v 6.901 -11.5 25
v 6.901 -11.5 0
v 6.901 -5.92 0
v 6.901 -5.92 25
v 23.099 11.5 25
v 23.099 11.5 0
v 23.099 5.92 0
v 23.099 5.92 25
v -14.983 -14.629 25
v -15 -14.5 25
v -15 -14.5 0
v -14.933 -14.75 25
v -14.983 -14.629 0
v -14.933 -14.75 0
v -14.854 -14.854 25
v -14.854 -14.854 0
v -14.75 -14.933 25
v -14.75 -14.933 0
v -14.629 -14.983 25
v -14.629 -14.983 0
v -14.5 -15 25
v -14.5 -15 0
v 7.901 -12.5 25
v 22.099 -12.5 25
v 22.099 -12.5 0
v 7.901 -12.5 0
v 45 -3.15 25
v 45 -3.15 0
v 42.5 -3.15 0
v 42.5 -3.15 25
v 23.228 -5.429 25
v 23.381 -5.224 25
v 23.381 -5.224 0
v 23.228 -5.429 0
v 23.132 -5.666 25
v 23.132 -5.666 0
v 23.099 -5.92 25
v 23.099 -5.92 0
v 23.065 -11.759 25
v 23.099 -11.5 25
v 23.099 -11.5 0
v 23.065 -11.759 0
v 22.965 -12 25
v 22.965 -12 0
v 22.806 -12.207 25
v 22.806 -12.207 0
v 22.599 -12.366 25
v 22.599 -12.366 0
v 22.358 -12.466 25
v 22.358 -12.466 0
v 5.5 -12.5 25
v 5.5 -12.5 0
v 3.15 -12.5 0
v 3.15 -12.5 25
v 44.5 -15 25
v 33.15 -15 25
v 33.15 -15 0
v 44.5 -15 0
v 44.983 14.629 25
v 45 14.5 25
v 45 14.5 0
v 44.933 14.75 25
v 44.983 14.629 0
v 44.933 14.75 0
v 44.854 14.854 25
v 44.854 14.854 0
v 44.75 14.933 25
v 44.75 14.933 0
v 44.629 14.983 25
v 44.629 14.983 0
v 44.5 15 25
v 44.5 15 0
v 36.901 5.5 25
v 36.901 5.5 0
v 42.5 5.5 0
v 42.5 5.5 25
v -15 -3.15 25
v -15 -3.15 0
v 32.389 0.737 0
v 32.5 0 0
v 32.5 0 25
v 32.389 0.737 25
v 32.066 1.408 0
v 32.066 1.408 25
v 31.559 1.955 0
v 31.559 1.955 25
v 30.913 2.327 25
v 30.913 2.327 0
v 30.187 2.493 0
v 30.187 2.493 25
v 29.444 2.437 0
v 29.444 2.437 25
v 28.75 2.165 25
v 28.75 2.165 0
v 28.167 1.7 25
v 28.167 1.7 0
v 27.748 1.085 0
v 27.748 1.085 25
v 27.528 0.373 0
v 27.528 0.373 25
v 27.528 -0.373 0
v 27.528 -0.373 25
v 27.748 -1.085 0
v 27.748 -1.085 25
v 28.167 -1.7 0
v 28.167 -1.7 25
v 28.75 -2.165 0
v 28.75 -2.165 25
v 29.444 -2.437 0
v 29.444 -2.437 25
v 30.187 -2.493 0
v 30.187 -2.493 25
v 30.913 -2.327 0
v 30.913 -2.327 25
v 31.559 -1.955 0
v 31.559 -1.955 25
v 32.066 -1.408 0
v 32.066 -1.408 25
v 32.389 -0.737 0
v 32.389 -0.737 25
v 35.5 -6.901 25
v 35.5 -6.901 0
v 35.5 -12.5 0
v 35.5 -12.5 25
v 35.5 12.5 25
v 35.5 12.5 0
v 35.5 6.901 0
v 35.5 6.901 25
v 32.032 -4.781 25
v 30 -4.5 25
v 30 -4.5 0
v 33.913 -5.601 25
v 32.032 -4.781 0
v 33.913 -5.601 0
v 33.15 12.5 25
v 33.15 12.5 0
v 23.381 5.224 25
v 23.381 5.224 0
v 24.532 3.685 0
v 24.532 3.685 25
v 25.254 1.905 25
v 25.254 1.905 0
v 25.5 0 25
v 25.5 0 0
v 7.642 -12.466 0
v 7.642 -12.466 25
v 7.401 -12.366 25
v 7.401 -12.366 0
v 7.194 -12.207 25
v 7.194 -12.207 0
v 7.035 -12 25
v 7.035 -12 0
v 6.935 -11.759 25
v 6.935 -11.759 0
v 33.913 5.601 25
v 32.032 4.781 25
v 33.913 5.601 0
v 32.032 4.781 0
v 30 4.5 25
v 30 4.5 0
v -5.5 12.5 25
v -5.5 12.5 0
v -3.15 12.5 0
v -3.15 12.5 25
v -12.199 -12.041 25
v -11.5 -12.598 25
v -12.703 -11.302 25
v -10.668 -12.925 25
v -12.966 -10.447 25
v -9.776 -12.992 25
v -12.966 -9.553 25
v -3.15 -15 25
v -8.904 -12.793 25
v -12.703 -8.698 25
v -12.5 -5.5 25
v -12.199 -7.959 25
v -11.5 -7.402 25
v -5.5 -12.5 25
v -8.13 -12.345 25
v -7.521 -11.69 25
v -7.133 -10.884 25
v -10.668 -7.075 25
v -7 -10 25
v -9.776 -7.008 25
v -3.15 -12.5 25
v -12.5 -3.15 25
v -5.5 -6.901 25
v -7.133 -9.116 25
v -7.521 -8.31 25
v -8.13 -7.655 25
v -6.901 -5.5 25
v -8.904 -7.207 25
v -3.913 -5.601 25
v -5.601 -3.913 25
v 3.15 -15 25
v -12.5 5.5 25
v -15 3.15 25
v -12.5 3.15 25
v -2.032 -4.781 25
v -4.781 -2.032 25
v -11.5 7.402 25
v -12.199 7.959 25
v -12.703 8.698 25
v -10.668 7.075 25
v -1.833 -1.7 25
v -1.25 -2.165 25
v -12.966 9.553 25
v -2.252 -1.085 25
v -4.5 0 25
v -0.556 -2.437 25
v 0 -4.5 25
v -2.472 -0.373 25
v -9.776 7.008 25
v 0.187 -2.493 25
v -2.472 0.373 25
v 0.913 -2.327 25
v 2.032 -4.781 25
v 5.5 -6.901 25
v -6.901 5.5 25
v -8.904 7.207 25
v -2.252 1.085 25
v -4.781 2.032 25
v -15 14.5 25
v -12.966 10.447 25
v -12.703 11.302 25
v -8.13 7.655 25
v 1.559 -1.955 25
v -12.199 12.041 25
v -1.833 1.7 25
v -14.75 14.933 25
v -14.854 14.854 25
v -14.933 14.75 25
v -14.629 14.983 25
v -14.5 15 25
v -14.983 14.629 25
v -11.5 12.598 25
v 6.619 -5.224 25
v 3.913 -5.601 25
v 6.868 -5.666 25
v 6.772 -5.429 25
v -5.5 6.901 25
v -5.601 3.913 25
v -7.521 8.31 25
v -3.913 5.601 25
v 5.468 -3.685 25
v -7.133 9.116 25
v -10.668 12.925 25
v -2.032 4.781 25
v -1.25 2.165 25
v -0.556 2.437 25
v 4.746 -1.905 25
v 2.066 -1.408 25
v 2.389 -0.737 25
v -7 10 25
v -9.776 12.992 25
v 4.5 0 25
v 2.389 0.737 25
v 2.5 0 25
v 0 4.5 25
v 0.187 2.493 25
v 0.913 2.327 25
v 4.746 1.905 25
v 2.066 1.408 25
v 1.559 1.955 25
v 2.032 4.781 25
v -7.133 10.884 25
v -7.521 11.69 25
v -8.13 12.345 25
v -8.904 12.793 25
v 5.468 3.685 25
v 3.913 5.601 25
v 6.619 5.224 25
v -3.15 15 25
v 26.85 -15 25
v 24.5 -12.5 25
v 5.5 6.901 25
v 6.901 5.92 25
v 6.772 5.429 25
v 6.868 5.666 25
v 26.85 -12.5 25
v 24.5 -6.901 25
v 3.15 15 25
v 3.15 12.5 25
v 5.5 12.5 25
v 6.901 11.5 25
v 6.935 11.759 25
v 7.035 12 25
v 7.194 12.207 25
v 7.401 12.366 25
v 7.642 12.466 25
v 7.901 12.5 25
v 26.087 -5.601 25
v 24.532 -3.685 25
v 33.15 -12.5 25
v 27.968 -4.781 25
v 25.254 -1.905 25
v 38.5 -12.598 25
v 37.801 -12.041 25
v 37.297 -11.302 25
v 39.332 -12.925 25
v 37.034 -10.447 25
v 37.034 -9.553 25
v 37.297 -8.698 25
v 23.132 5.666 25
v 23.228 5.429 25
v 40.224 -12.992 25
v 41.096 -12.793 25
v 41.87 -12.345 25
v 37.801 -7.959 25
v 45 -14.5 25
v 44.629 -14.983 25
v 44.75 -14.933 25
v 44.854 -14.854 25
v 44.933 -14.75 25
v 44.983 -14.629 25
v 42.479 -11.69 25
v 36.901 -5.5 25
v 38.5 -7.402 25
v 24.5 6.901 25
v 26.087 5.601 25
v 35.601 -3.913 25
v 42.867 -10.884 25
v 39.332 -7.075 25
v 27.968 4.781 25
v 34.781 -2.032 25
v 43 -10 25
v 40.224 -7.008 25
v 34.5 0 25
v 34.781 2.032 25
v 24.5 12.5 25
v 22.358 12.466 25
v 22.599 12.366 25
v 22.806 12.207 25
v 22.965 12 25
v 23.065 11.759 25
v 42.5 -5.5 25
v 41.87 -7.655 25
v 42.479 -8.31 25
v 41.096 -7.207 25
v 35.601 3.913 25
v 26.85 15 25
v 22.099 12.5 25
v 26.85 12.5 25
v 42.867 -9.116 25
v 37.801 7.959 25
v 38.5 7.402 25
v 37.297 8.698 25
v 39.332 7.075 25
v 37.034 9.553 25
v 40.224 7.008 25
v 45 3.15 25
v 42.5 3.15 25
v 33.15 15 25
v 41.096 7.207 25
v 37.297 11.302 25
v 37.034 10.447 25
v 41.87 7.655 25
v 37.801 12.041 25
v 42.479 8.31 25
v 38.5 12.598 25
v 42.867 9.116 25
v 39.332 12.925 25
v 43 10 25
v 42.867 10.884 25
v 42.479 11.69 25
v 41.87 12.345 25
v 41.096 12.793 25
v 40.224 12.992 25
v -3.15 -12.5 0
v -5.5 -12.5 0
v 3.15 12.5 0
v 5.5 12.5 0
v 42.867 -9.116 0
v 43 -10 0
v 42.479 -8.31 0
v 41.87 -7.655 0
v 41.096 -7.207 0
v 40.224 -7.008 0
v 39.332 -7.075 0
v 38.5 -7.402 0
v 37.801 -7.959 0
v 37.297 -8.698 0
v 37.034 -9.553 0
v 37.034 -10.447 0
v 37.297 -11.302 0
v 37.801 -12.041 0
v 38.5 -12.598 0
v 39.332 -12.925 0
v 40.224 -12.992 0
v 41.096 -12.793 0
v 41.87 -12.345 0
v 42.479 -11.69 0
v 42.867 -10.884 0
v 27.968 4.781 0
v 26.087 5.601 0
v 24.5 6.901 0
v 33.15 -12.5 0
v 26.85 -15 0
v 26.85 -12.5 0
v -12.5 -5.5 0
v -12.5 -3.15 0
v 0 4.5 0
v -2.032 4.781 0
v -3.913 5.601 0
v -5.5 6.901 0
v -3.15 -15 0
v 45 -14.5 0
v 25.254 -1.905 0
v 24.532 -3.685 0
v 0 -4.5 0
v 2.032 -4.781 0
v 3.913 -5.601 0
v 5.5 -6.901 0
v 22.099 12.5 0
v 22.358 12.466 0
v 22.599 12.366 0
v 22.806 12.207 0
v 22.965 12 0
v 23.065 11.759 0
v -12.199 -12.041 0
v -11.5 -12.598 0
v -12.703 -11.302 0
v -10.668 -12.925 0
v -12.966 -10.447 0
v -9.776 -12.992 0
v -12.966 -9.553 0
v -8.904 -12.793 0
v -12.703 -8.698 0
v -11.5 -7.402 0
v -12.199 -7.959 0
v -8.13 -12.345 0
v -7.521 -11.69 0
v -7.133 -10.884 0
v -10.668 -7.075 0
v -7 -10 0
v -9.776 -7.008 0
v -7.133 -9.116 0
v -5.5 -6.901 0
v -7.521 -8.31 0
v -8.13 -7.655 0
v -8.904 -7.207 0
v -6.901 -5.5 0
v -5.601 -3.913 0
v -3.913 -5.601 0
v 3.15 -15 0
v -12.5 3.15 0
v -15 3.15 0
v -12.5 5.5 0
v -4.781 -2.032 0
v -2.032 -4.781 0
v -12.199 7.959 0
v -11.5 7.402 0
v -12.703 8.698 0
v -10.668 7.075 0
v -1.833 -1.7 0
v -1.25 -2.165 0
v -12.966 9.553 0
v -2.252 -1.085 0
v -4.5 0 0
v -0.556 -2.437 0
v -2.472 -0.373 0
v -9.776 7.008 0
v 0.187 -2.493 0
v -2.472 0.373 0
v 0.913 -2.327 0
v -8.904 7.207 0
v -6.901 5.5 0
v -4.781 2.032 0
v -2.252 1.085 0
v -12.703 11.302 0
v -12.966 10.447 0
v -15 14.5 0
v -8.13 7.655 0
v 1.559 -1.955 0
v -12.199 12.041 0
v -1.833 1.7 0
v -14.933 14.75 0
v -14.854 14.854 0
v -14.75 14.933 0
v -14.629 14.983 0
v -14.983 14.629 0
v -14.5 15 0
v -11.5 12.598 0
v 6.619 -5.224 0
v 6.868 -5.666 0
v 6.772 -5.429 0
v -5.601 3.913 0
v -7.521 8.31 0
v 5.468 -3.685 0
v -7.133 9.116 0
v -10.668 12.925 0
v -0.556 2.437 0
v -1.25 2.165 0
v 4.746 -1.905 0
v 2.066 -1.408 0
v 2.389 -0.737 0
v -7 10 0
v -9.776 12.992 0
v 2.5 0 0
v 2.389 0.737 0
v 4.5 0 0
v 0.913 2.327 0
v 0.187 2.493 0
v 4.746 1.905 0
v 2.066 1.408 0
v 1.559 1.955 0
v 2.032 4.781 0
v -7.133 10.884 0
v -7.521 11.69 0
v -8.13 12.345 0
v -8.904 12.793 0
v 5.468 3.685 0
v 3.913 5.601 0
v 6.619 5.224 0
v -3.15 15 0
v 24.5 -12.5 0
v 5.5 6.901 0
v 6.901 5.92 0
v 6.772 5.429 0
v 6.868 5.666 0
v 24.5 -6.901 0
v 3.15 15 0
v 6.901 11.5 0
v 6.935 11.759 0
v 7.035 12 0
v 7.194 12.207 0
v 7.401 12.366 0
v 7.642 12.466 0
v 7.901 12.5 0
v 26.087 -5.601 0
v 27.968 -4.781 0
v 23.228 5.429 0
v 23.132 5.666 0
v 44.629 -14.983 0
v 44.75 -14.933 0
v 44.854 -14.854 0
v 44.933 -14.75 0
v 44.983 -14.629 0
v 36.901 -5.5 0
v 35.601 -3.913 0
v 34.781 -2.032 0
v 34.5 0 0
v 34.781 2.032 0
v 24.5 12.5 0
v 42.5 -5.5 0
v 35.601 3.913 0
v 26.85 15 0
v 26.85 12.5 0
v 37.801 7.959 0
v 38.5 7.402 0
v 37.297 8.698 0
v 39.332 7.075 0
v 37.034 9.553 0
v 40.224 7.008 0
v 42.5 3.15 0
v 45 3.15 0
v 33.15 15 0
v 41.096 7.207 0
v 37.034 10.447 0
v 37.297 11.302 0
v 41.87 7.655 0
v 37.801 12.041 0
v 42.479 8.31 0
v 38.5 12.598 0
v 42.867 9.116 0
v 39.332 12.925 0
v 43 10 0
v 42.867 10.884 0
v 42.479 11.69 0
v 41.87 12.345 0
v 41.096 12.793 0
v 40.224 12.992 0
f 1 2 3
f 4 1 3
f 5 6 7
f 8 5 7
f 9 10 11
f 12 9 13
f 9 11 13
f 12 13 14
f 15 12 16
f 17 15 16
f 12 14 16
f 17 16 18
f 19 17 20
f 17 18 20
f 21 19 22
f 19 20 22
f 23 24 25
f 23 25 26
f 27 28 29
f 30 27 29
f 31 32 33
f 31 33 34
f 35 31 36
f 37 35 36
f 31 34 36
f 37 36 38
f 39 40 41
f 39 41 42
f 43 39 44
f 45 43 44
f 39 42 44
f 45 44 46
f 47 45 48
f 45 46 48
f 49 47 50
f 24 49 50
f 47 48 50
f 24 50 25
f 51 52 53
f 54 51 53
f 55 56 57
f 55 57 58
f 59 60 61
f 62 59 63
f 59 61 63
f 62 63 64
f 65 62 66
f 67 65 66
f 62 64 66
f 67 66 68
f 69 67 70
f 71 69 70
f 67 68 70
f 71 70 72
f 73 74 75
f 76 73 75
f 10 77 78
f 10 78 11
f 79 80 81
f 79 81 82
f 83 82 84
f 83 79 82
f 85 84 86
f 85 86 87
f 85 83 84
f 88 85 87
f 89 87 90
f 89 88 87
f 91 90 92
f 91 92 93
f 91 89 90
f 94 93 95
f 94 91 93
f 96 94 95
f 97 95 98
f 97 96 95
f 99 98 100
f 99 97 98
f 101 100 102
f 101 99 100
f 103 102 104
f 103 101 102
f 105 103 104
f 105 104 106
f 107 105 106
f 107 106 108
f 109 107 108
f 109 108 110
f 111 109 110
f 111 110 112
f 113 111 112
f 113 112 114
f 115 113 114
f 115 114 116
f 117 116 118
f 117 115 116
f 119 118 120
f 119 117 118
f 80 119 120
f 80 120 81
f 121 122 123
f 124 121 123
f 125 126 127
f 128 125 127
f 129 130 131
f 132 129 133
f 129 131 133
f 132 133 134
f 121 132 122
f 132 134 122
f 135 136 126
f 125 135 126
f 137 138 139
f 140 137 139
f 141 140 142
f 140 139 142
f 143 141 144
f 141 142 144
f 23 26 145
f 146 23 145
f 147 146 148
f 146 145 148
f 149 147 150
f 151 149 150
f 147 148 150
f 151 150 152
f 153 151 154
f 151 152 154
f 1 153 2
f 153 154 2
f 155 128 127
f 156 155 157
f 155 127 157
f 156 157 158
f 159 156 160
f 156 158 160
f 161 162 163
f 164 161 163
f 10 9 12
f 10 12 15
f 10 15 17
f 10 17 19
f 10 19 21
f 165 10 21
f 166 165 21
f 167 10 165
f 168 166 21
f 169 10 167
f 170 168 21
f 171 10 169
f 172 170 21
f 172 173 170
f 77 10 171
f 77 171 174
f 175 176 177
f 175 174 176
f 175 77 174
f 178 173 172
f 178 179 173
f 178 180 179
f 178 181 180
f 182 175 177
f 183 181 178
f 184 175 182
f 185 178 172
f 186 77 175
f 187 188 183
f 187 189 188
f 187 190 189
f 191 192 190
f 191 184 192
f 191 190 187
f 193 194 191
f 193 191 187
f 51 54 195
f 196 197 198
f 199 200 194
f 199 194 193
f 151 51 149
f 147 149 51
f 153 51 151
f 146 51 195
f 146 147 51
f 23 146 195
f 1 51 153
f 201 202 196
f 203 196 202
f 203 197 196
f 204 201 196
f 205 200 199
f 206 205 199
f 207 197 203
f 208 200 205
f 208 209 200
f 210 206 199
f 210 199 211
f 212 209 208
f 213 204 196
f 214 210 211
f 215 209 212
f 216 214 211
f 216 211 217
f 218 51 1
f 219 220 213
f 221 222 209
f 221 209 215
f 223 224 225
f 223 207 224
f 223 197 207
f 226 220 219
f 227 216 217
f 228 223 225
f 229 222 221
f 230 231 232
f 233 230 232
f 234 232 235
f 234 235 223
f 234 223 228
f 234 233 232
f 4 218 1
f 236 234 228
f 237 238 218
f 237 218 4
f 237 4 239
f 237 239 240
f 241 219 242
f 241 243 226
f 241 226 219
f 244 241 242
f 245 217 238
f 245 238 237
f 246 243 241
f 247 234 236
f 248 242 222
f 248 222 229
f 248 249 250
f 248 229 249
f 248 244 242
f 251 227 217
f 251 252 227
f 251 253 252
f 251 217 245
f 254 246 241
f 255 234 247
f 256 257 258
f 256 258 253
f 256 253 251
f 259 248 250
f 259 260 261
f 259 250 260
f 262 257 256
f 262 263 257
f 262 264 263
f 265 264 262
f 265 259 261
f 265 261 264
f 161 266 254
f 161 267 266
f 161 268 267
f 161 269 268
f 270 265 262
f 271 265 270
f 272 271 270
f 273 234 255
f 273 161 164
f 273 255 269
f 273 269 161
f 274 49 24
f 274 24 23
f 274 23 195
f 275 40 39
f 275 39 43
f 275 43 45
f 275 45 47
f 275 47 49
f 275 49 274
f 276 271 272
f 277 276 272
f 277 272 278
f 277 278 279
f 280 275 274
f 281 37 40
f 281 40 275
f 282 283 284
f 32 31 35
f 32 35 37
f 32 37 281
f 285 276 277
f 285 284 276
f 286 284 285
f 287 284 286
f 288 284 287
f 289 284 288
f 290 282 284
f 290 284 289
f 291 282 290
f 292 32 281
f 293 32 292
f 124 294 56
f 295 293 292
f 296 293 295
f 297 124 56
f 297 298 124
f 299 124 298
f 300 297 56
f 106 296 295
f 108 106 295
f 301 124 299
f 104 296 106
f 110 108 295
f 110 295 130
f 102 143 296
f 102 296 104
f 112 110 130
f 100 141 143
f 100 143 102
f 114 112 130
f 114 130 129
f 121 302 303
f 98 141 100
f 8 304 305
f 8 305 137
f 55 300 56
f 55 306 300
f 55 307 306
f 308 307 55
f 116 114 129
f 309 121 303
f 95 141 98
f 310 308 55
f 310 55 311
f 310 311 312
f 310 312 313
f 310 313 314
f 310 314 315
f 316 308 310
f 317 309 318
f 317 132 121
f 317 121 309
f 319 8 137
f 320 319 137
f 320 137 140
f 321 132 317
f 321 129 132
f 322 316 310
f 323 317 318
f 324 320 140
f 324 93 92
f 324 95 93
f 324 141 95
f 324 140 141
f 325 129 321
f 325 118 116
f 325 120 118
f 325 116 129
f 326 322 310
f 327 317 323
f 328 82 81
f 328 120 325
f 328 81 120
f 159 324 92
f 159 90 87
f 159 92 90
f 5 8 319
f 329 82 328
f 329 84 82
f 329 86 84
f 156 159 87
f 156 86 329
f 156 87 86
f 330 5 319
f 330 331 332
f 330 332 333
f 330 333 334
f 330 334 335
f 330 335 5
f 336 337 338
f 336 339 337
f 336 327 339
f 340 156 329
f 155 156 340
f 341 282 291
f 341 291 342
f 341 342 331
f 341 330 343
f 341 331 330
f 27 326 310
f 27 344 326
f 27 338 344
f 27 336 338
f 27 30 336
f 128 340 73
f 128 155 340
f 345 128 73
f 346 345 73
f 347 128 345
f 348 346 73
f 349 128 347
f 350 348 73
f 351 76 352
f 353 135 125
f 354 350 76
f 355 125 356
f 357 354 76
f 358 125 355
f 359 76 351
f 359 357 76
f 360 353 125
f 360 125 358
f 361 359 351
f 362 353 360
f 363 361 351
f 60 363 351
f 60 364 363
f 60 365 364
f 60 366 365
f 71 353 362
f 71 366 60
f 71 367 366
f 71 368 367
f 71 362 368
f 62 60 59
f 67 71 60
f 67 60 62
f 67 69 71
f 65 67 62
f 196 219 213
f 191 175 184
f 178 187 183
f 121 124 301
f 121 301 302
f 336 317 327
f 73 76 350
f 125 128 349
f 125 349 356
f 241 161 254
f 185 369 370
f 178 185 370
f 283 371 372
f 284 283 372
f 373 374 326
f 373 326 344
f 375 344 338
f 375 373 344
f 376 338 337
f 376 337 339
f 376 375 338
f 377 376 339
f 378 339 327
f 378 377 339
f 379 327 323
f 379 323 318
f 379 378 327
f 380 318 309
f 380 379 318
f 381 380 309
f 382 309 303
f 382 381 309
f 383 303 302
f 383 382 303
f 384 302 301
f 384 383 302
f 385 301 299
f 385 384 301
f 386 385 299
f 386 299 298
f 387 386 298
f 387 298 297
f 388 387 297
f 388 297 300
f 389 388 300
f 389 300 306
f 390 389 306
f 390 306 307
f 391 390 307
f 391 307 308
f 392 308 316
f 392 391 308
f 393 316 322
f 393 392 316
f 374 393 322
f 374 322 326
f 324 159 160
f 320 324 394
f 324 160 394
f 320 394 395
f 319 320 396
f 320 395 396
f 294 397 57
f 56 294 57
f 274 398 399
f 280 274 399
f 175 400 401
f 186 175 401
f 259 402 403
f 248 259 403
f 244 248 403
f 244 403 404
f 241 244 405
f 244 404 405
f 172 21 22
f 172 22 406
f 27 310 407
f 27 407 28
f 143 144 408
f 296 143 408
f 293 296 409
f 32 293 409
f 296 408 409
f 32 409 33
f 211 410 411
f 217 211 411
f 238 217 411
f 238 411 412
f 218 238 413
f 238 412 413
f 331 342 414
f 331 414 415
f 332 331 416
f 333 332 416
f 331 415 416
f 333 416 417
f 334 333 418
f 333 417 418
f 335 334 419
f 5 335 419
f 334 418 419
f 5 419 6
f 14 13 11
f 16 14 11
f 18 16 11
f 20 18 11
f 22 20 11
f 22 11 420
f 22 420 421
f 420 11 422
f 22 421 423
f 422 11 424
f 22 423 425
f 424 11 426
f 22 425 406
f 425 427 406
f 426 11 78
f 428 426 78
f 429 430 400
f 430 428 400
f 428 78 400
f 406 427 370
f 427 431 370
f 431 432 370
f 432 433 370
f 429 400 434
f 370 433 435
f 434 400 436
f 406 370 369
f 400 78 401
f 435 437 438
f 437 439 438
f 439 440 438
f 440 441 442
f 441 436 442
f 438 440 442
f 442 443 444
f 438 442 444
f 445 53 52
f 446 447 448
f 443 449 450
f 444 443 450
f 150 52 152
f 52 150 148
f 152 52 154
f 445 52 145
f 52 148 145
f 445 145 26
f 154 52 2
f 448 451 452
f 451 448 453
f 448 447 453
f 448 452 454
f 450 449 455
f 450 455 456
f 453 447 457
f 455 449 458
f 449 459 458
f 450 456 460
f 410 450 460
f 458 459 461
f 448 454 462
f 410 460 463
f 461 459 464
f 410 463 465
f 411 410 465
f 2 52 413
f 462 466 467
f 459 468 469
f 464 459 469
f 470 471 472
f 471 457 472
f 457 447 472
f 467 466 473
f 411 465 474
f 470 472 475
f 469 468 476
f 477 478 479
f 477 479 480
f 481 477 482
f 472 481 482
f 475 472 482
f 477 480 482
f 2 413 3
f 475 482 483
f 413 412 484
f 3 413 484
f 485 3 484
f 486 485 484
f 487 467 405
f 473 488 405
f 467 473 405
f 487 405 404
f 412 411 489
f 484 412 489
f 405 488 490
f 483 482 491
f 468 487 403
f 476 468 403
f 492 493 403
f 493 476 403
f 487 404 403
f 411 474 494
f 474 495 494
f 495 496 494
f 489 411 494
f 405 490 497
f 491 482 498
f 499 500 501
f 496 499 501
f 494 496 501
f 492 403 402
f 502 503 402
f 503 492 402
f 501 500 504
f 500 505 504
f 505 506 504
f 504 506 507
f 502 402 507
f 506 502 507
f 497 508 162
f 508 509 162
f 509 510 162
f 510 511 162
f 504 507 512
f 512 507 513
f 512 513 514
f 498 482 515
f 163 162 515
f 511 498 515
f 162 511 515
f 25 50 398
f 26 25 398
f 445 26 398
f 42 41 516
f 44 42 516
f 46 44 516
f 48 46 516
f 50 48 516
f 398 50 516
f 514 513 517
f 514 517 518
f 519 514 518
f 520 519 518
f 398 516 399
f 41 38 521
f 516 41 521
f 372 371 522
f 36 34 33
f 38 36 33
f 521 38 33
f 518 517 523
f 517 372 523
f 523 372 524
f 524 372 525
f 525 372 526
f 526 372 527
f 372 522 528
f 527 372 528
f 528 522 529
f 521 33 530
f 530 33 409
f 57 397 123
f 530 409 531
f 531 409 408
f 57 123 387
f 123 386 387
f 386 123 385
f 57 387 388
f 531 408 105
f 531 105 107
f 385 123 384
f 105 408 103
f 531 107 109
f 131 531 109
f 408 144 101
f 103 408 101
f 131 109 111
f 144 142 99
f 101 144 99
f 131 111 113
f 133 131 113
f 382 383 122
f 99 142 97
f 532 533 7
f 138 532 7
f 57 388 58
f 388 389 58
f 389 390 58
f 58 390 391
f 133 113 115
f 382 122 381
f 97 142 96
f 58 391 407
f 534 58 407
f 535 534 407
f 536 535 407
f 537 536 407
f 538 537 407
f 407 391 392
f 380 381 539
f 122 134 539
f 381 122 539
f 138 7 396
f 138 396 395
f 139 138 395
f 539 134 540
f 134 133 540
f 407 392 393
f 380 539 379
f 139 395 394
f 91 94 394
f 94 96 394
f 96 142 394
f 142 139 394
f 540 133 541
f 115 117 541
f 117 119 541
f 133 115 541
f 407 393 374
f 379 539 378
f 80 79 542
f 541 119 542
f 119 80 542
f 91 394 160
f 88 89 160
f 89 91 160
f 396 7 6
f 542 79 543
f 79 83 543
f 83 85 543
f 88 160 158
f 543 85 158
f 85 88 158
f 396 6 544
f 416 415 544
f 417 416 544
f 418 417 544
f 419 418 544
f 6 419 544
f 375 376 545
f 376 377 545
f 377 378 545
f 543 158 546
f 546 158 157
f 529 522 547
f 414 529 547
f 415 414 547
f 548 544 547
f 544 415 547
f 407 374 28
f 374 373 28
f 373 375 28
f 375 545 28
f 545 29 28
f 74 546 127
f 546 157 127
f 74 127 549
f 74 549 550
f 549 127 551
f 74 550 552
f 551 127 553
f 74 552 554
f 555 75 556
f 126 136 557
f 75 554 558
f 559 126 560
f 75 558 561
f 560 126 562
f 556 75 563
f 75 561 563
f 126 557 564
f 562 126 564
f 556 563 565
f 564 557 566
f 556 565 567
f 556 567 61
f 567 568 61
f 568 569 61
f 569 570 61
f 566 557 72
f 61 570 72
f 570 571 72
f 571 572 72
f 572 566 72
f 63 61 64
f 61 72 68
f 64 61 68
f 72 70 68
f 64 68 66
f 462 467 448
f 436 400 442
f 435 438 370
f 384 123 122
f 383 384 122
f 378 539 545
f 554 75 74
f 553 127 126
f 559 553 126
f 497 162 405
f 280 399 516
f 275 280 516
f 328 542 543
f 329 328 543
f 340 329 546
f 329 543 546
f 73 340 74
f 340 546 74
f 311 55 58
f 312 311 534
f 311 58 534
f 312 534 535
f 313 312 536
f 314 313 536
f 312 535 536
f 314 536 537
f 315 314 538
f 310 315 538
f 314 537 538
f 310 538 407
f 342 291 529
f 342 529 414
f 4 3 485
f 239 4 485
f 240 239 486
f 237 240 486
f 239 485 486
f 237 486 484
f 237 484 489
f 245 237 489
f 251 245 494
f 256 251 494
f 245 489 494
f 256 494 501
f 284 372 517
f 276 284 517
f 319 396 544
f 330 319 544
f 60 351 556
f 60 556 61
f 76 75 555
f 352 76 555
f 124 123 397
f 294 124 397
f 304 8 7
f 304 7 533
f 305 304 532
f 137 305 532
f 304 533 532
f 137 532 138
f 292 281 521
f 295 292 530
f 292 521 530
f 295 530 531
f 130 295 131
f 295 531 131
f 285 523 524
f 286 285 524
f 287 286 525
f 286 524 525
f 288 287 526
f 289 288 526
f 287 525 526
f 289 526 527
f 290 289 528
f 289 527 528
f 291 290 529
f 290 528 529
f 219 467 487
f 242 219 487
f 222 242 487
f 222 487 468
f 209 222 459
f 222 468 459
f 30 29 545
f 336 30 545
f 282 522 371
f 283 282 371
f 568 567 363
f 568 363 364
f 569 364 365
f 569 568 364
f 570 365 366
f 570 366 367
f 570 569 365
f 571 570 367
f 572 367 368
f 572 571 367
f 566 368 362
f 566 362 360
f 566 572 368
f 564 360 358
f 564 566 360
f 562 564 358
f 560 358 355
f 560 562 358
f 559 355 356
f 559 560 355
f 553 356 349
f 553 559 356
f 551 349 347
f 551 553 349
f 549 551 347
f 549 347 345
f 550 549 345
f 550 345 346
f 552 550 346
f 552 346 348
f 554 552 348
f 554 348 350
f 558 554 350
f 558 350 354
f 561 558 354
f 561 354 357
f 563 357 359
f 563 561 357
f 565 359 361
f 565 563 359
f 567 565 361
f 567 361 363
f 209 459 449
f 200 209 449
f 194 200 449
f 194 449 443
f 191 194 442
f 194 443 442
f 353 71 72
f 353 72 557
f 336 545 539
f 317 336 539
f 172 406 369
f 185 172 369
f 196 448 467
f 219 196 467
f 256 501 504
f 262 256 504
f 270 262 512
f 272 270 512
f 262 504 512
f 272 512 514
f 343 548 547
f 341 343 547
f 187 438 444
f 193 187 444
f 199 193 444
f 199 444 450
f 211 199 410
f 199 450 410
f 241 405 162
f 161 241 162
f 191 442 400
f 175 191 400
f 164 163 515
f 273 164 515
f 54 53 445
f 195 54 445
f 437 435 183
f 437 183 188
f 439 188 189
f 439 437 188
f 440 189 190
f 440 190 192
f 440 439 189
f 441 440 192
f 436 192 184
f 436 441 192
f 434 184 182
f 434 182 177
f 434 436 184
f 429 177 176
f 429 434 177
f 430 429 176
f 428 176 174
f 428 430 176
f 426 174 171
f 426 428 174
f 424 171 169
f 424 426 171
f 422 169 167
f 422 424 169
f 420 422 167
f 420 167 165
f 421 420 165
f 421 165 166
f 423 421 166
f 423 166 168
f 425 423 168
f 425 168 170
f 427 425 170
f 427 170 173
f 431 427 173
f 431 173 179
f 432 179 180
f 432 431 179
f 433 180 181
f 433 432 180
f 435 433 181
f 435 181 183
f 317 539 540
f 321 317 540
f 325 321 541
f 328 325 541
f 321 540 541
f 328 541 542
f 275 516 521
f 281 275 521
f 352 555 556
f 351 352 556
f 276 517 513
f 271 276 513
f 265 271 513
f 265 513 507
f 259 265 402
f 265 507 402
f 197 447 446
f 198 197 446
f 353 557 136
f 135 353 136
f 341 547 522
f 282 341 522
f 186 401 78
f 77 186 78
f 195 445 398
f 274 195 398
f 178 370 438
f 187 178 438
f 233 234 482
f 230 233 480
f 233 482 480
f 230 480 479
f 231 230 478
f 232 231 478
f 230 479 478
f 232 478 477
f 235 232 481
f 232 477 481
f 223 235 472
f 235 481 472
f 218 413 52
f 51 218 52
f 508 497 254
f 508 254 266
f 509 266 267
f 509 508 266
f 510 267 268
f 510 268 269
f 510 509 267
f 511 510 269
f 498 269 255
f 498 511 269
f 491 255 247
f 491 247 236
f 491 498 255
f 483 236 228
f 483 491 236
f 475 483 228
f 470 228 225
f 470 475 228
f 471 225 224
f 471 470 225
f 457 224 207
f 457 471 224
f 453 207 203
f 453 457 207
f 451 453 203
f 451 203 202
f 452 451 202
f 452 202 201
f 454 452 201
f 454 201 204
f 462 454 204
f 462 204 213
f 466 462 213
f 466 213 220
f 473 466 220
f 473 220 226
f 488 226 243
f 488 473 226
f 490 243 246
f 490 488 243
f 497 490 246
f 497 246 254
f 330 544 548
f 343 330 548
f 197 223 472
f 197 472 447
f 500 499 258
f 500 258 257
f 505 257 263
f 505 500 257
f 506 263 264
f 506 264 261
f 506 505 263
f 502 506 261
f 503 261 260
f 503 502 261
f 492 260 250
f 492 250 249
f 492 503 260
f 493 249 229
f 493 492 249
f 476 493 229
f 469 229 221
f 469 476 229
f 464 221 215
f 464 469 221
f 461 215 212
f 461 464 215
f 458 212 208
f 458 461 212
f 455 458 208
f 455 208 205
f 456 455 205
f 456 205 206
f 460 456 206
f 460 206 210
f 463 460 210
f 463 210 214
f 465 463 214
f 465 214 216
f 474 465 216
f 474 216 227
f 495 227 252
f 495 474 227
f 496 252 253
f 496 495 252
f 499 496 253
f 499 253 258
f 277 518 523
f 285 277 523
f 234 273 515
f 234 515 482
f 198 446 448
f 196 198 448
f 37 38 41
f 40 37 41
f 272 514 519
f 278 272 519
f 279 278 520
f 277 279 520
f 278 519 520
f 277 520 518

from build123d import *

# Parameters (mm, degrees)
F0_R     = 3
F0_R_2   = 2.5
F1_DEPTH = 25


with BuildPart() as f1:
    # F0 (on Top) → F1 (new body)
    with BuildSketch(Plane.XY):
        with BuildLine():
            ThreePointArc((-14.5, 15), (-14.853553, 14.853553), (-15, 14.5))
            Line((-15, 14.5), (-15, 3.15))
            Line((-15, 3.15), (-12.5, 3.15))
            Line((-12.5, 3.15), (-12.5, 5.5))
            Line((-12.5, 5.5), (-6.90098, 5.5))
            ThreePointArc((-6.90098, 5.5), (-5.126404, 3.000613), (-4.5, 0))
            ThreePointArc((-4.5, 0), (-5.126404, -3.000613), (-6.90098, -5.5))
            Line((-6.90098, -5.5), (-12.5, -5.5))
            Line((-12.5, -5.5), (-12.5, -3.15))
            Line((-12.5, -3.15), (-15, -3.15))
            Line((-15, -3.15), (-15, -14.5))
            ThreePointArc((-15, -14.5), (-14.853553, -14.853553), (-14.5, -15))
            Line((-14.5, -15), (-3.15, -15))
            Line((-3.15, -15), (-3.15, -12.5))
            Line((-3.15, -12.5), (-5.5, -12.5))
            Line((-5.5, -12.5), (-5.5, -6.90098))
            ThreePointArc((-5.5, -6.90098), (-3.000613, -5.126404), (0, -4.5))
            ThreePointArc((0, -4.5), (3.000613, -5.126404), (5.5, -6.90098))
            Line((5.5, -6.90098), (5.5, -12.5))
            Line((5.5, -12.5), (3.15, -12.5))
            Line((3.15, -12.5), (3.15, -15))
            Line((3.15, -15), (26.85, -15))
            Line((26.85, -15), (26.85, -12.5))
            Line((26.85, -12.5), (24.5, -12.5))
            Line((24.5, -12.5), (24.5, -6.90098))
            ThreePointArc((24.5, -6.90098), (26.999387, -5.126404), (30, -4.5))
            ThreePointArc((30, -4.5), (33.000613, -5.126404), (35.5, -6.90098))
            Line((35.5, -6.90098), (35.5, -12.5))
            Line((35.5, -12.5), (33.15, -12.5))
            Line((33.15, -12.5), (33.15, -15))
            Line((33.15, -15), (44.5, -15))
            ThreePointArc((44.5, -15), (44.853553, -14.853553), (45, -14.5))
            Line((45, -14.5), (45, -3.15))
            Line((45, -3.15), (42.5, -3.15))
            Line((42.5, -3.15), (42.5, -5.5))
            Line((42.5, -5.5), (36.90098, -5.5))
            ThreePointArc((36.90098, -5.5), (35.126404, -3.000613), (34.5, 0))
            ThreePointArc((34.5, 0), (35.126404, 3.000613), (36.90098, 5.5))
            Line((36.90098, 5.5), (42.5, 5.5))
            Line((42.5, 5.5), (42.5, 3.15))
            Line((42.5, 3.15), (45, 3.15))
            Line((45, 3.15), (45, 14.5))
            ThreePointArc((45, 14.5), (44.853553, 14.853553), (44.5, 15))
            Line((44.5, 15), (33.15, 15))
            Line((33.15, 15), (33.15, 12.5))
            Line((33.15, 12.5), (35.5, 12.5))
            Line((35.5, 12.5), (35.5, 6.90098))
            ThreePointArc((35.5, 6.90098), (33.000613, 5.126404), (30, 4.5))
            ThreePointArc((30, 4.5), (26.999387, 5.126404), (24.5, 6.90098))
            Line((24.5, 6.90098), (24.5, 12.5))
            Line((24.5, 12.5), (26.85, 12.5))
            Line((26.85, 12.5), (26.85, 15))
            Line((26.85, 15), (3.15, 15))
            Line((3.15, 15), (3.15, 12.5))
            Line((3.15, 12.5), (5.5, 12.5))
            Line((5.5, 12.5), (5.5, 6.90098))
            ThreePointArc((5.5, 6.90098), (3.000613, 5.126404), (0, 4.5))
            ThreePointArc((0, 4.5), (-3.000613, 5.126404), (-5.5, 6.90098))
            Line((-5.5, 6.90098), (-5.5, 12.5))
            Line((-5.5, 12.5), (-3.15, 12.5))
            Line((-3.15, 12.5), (-3.15, 15))
            Line((-3.15, 15), (-14.5, 15))
        make_face()
        with Locations((-10, -10)):
            Circle(F0_R, mode=Mode.SUBTRACT)
        with Locations((40, -10)):
            Circle(F0_R, mode=Mode.SUBTRACT)
        Circle(F0_R_2, mode=Mode.SUBTRACT)
        with Locations((-10, 10)):
            Circle(F0_R, mode=Mode.SUBTRACT)
        with BuildLine():
            ThreePointArc((6.618512, -5.223944), (5.049778, -2.818585), (4.5, 0))
            ThreePointArc((4.5, 0), (5.049778, 2.818585), (6.618512, 5.223944))
            ThreePointArc((6.618512, 5.223944), (6.827677, 5.544658), (6.90098, 5.92047))
            Line((6.90098, 5.92047), (6.90098, 11.5))
            ThreePointArc((6.90098, 11.5), (7.193874, 12.207107), (7.90098, 12.5))
            Line((7.90098, 12.5), (15, 12.5))
            Line((15, 12.5), (22.09902, 12.5))
            ThreePointArc((22.09902, 12.5), (22.806126, 12.207107), (23.09902, 11.5))
            Line((23.09902, 11.5), (23.09902, 5.92047))
            ThreePointArc((23.09902, 5.92047), (23.172323, 5.544658), (23.381488, 5.223944))
            ThreePointArc((23.381488, 5.223944), (24.950222, 2.818585), (25.5, 0))
            ThreePointArc((25.5, 0), (24.950222, -2.818585), (23.381488, -5.223944))
            ThreePointArc((23.381488, -5.223944), (23.172323, -5.544658), (23.09902, -5.92047))
            Line((23.09902, -5.92047), (23.09902, -11.5))
            ThreePointArc((23.09902, -11.5), (22.806126, -12.207107), (22.09902, -12.5))
            Line((22.09902, -12.5), (15, -12.5))
            Line((15, -12.5), (7.90098, -12.5))
            ThreePointArc((7.90098, -12.5), (7.193874, -12.207107), (6.90098, -11.5))
            Line((6.90098, -11.5), (6.90098, -5.92047))
            ThreePointArc((6.90098, -5.92047), (6.827677, -5.544658), (6.618512, -5.223944))
        make_face(mode=Mode.SUBTRACT)
        with Locations((30, 0)):
            Circle(F0_R_2, mode=Mode.SUBTRACT)
        with Locations((40, 10)):
            Circle(F0_R, mode=Mode.SUBTRACT)
    extrude(amount=F1_DEPTH)


solid = f1.part
